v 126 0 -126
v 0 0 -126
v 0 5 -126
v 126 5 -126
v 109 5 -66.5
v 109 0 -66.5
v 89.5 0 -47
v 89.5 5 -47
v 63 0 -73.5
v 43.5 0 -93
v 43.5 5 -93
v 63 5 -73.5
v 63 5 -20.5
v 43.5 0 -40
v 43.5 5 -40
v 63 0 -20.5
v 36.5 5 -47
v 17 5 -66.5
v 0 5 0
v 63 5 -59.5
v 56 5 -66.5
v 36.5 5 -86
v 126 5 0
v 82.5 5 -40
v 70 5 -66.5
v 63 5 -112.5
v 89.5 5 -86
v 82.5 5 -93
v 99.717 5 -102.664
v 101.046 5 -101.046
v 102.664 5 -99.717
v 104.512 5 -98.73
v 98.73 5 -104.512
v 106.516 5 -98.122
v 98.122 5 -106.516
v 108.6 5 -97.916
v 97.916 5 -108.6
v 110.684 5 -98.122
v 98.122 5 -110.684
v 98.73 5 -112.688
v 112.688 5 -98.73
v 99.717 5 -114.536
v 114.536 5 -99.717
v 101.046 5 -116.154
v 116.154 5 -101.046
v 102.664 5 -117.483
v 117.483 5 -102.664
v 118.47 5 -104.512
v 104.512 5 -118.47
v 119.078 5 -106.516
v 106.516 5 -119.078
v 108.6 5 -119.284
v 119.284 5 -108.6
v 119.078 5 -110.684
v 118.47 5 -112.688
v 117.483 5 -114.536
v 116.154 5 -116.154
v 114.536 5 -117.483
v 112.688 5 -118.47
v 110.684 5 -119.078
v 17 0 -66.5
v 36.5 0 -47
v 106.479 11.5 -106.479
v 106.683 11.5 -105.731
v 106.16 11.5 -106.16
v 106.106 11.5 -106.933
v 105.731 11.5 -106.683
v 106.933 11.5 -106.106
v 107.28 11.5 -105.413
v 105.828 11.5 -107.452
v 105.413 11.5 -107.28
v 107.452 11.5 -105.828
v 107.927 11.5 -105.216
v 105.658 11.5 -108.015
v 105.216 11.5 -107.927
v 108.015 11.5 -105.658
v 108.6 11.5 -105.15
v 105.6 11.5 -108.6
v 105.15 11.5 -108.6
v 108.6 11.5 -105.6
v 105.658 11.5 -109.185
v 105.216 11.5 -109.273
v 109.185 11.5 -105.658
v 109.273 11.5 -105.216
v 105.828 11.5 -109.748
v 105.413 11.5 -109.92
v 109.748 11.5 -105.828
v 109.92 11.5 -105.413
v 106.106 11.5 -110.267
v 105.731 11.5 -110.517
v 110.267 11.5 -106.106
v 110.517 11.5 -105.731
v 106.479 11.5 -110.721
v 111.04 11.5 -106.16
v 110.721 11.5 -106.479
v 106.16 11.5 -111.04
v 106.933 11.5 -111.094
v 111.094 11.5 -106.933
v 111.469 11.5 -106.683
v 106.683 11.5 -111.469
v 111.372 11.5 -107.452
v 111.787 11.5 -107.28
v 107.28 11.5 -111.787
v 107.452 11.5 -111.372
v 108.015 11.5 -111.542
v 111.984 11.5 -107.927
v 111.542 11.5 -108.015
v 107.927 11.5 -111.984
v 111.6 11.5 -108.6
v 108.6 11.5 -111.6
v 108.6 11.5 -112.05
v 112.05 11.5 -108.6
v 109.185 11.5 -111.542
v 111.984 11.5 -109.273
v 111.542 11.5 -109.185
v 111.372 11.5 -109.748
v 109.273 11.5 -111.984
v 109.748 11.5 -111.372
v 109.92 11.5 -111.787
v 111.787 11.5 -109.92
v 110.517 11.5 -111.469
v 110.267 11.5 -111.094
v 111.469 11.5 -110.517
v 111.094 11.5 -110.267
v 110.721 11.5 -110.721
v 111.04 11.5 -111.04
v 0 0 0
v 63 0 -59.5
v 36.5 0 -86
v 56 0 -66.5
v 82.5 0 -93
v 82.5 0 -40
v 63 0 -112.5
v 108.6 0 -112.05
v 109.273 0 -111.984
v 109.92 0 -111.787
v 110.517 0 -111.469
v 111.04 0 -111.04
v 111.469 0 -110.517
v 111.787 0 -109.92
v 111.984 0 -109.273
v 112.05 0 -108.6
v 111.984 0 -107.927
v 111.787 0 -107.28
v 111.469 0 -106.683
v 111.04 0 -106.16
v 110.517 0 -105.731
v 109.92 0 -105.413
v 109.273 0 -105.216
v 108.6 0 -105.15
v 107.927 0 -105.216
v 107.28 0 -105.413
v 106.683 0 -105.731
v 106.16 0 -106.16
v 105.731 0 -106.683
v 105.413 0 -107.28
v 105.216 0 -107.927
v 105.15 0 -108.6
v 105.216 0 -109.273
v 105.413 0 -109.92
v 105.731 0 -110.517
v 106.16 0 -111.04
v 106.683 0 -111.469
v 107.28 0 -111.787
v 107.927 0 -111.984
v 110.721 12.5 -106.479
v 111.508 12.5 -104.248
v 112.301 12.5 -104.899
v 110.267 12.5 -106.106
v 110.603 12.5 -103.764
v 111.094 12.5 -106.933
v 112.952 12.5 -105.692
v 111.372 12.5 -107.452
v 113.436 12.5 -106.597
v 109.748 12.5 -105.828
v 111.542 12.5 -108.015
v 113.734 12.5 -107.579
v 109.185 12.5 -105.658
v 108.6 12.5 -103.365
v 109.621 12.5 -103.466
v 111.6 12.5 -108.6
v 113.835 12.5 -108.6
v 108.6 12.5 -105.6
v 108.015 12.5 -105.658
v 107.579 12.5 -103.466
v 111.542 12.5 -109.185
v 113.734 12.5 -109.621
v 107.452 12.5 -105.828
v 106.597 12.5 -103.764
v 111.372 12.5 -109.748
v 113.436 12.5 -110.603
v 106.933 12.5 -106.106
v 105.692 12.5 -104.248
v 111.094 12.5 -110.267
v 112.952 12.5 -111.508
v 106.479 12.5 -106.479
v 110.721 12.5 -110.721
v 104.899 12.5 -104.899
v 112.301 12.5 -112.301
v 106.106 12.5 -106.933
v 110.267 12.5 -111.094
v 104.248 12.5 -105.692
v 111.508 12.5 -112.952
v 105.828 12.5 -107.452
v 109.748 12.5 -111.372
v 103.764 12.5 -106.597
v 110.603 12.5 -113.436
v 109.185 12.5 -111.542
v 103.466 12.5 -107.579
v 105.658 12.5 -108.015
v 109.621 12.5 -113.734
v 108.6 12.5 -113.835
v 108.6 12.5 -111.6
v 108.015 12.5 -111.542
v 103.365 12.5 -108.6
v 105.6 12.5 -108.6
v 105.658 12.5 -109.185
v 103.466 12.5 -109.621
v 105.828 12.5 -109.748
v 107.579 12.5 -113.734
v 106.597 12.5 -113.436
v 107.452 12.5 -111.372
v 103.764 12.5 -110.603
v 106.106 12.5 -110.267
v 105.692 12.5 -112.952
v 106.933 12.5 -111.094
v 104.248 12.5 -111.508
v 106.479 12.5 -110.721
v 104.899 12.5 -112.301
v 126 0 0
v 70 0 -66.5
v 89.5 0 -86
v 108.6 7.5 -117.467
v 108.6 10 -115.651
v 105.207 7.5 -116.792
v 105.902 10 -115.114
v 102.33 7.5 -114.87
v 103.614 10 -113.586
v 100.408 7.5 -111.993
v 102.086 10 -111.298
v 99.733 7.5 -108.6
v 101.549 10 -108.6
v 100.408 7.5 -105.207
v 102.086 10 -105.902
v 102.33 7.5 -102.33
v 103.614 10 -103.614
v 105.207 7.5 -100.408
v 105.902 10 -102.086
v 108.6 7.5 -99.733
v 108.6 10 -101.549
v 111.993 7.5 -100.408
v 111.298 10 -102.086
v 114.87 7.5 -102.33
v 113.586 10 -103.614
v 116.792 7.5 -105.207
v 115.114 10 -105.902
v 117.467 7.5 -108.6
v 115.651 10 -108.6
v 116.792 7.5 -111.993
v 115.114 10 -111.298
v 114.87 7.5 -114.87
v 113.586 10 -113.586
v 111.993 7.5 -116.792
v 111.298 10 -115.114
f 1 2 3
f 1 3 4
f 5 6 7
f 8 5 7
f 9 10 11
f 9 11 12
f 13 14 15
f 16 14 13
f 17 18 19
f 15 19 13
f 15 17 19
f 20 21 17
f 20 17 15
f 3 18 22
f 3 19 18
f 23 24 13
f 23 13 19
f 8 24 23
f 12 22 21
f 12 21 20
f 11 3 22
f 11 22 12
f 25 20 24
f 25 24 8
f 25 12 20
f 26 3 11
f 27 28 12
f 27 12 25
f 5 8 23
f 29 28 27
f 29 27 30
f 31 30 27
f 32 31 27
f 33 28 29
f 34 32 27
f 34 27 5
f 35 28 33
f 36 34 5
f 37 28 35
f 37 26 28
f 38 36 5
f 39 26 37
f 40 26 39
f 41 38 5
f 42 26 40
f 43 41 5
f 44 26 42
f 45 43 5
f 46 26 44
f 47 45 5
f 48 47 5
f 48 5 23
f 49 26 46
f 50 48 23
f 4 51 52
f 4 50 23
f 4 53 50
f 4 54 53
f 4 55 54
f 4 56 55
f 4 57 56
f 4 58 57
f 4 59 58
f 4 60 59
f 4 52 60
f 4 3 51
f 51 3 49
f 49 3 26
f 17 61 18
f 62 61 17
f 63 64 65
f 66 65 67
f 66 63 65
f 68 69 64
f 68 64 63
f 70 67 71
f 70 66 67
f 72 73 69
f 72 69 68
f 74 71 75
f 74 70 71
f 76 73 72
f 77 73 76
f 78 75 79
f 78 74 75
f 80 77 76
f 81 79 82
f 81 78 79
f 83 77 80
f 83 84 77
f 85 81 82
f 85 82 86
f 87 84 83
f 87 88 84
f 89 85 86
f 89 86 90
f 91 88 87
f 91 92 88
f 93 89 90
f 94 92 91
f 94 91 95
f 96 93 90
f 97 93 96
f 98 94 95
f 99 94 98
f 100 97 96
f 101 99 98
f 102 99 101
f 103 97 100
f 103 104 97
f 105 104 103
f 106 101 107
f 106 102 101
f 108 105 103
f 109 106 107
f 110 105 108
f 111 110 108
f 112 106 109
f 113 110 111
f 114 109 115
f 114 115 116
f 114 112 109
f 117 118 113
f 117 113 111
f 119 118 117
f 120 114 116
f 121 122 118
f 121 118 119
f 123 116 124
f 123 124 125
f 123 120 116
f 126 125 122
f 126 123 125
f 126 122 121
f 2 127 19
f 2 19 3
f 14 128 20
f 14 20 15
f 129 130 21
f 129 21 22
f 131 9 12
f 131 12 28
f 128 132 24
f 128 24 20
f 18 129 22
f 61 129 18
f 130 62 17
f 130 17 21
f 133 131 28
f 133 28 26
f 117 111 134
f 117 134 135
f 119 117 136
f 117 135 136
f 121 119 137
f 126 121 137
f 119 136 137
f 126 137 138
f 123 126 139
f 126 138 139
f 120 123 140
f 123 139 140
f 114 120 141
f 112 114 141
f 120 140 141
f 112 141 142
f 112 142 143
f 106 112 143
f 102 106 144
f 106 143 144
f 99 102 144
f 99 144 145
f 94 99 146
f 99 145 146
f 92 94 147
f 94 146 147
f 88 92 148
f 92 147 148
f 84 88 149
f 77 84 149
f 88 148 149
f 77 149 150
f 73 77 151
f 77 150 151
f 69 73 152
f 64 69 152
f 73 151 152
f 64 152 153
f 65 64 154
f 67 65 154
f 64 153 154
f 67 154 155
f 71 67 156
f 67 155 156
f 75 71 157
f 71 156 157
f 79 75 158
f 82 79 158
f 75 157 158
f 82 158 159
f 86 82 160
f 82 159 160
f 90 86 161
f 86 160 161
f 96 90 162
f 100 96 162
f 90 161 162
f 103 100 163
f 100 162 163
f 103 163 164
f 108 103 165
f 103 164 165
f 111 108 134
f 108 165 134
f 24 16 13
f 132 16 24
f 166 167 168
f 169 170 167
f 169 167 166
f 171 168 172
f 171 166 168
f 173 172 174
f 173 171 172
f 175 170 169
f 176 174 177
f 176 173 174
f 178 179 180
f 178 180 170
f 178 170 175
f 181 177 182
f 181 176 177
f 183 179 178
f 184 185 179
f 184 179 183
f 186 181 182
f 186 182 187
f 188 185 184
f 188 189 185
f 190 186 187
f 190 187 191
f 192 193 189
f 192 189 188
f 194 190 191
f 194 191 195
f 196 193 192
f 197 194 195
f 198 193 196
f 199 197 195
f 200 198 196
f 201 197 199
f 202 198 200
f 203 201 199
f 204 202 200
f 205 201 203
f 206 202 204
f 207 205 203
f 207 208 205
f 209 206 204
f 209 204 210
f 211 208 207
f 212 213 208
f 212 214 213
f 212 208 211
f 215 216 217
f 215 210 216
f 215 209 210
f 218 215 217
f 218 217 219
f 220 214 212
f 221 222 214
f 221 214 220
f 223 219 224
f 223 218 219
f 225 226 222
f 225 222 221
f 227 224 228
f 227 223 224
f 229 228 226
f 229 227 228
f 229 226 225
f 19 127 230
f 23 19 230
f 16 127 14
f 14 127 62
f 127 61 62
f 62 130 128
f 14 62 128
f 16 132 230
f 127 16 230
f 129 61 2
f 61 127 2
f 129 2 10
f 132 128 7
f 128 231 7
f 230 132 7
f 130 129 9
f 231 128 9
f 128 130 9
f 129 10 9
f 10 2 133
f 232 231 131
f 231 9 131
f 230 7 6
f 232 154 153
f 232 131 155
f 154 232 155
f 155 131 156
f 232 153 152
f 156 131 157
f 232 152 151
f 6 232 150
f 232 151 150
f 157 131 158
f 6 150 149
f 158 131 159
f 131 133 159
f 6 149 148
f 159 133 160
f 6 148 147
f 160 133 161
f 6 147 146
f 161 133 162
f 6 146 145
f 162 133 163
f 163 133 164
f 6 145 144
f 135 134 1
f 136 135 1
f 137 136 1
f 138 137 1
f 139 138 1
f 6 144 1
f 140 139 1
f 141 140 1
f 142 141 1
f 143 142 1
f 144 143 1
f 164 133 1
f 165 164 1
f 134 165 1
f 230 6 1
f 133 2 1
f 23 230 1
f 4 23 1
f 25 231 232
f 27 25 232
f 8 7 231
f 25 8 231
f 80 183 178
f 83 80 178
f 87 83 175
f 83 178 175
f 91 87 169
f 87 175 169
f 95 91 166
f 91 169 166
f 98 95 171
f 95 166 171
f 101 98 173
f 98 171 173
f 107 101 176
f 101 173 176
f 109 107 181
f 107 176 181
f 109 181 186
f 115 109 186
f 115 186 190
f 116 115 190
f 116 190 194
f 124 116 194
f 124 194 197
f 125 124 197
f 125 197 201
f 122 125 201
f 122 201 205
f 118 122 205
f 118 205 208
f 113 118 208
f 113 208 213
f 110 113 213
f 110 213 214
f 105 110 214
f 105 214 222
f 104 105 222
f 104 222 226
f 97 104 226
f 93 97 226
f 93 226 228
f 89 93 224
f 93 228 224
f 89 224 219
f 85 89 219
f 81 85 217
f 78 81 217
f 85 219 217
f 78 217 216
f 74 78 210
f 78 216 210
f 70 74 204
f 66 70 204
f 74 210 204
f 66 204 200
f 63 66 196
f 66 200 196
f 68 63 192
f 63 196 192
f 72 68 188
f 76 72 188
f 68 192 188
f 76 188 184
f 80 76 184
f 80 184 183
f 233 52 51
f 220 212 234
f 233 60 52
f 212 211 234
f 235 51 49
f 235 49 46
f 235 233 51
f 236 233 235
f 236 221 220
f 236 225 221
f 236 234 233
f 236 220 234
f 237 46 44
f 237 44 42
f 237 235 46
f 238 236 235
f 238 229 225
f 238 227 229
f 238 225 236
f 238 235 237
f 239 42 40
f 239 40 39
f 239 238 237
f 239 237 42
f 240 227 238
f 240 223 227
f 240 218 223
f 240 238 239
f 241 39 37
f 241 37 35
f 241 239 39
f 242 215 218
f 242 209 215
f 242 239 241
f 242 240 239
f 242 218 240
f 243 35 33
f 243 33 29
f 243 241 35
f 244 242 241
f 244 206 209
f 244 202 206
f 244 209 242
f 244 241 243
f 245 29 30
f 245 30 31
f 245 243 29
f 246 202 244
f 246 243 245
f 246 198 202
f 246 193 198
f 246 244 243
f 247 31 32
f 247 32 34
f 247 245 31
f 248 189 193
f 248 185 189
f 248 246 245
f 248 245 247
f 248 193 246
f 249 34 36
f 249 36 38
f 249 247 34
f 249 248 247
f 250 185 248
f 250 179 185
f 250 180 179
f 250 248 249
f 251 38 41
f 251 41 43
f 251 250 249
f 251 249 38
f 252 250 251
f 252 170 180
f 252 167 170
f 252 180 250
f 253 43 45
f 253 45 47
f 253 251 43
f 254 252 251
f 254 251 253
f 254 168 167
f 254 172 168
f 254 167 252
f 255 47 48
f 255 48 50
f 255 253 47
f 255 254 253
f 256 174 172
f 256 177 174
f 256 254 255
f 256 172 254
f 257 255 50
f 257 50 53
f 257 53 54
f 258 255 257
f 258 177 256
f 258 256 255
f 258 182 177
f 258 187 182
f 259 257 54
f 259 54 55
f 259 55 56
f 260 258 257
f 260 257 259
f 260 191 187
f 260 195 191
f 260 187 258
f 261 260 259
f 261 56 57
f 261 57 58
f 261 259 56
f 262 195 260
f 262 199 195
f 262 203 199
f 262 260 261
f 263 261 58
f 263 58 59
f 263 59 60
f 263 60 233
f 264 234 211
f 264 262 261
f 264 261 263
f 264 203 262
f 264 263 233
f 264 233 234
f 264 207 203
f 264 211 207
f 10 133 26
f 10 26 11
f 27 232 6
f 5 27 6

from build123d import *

# Parameters (mm, degrees)
SKETCH1_W               = 126
SKETCH1_H               = 126
BOSS_EXTRUDE1_DEPTH     = 5
SKETCH3_R               = 12.5
BOSS_EXTRUDE2_DEPTH     = 7.5
SKETCH4_R               = 3.45
CUT_EXTRUDE1_DEPTH      = 11.5
SKETCH6_R               = 3
CUT_EXTRUDE2_DEPTH      = 179.628805068
CHAMFER1_SIZE           = 10
CHAMFER1_SIZE_2         = 7.26542528
CUT_EXTRUDE3_DEPTH      = 179.348675353
CUT_EXTRUDE3_DEPTH_BACK = 179.348675353


with BuildPart() as part:
    # Sketch1 → Boss-Extrude1 (new body)
    with BuildSketch(Plane(origin=(0, 0, 0), x_dir=(1, 0, 0), z_dir=(0, 1, 0))):
        with Locations((63, 63)):
            Rectangle(SKETCH1_W, SKETCH1_H)
    extrude(amount=BOSS_EXTRUDE1_DEPTH)

    # Sketch3 → Boss-Extrude2 (add)
    with BuildSketch(Plane(origin=(0, 5, 0), x_dir=(1, 0, 0), z_dir=(0, 1, 0))):
        with Locations(Location((108.6, 108.6, 0), (0, 0, 90))):
            Circle(SKETCH3_R)
    extrude(amount=BOSS_EXTRUDE2_DEPTH)

    # Sketch4 → Cut-Extrude1 (cut)
    with BuildSketch(Plane.XZ):
        with Locations(Location((108.6, -108.6, 0), (0, 0, 270))):
            Circle(SKETCH4_R)
    extrude(amount=-CUT_EXTRUDE1_DEPTH, mode=Mode.SUBTRACT)

    # Sketch6 → Cut-Extrude2 (cut, through all)
    with BuildSketch(Plane(origin=(0, 12.5, 0), x_dir=(1, 0, 0), z_dir=(0, 1, 0))):
        with Locations(Location((108.6, 108.6, 0), (0, 0, 270))):
            Circle(SKETCH6_R)
    extrude(amount=-CUT_EXTRUDE2_DEPTH, mode=Mode.SUBTRACT)

    # Chamfer1
    # the kernel refuses this chamfer: 10, 7.26542528 mm, written as the material it takes off along each edge
    with BuildSketch(Plane(origin=(108.6, 12.5, -108.6), x_dir=(0, 0, -1), z_dir=(1, 0, 0))) as chamfer1_piece_1_section:
        Polygon((12.5, -CHAMFER1_SIZE), (12.5 - CHAMFER1_SIZE_2, 0), (12.5, 0), align=None)
    chamfer1_piece_1 = revolve(axis=Axis((108.6, 12.5, -108.6), (0, 1, 0)), mode=Mode.PRIVATE)
    chamfer1_piece_1 = split(chamfer1_piece_1, bisect_by=Plane(origin=(108.6, 5, -100.650989912), z_dir=(0, 1, 0)), keep=Keep.TOP, mode=Mode.PRIVATE)
    add(chamfer1_piece_1, mode=Mode.SUBTRACT)

    # Sketch7 → Cut-Extrude3 (cut, two sides: drawn at the far end of the back side and taken through both)
    with BuildSketch(Plane(origin=(0, 5, 0), x_dir=(1, 0, 0), z_dir=(0, 1, 0)).offset(-CUT_EXTRUDE3_DEPTH_BACK)):
        Polygon((70, 66.5), (89.5, 86), (109, 66.5), (89.5, 47), align=None)
        Polygon((63, 73.5), (82.5, 93), (63, 112.5), (43.5, 93), align=None)
        Polygon((56, 66.5), (36.5, 86), (17, 66.5), (36.5, 47), align=None)
        Polygon((63, 59.5), (43.5, 40), (63, 20.5), (82.5, 40), align=None)
    extrude(amount=CUT_EXTRUDE3_DEPTH + CUT_EXTRUDE3_DEPTH_BACK, mode=Mode.SUBTRACT)


solid = part.part
